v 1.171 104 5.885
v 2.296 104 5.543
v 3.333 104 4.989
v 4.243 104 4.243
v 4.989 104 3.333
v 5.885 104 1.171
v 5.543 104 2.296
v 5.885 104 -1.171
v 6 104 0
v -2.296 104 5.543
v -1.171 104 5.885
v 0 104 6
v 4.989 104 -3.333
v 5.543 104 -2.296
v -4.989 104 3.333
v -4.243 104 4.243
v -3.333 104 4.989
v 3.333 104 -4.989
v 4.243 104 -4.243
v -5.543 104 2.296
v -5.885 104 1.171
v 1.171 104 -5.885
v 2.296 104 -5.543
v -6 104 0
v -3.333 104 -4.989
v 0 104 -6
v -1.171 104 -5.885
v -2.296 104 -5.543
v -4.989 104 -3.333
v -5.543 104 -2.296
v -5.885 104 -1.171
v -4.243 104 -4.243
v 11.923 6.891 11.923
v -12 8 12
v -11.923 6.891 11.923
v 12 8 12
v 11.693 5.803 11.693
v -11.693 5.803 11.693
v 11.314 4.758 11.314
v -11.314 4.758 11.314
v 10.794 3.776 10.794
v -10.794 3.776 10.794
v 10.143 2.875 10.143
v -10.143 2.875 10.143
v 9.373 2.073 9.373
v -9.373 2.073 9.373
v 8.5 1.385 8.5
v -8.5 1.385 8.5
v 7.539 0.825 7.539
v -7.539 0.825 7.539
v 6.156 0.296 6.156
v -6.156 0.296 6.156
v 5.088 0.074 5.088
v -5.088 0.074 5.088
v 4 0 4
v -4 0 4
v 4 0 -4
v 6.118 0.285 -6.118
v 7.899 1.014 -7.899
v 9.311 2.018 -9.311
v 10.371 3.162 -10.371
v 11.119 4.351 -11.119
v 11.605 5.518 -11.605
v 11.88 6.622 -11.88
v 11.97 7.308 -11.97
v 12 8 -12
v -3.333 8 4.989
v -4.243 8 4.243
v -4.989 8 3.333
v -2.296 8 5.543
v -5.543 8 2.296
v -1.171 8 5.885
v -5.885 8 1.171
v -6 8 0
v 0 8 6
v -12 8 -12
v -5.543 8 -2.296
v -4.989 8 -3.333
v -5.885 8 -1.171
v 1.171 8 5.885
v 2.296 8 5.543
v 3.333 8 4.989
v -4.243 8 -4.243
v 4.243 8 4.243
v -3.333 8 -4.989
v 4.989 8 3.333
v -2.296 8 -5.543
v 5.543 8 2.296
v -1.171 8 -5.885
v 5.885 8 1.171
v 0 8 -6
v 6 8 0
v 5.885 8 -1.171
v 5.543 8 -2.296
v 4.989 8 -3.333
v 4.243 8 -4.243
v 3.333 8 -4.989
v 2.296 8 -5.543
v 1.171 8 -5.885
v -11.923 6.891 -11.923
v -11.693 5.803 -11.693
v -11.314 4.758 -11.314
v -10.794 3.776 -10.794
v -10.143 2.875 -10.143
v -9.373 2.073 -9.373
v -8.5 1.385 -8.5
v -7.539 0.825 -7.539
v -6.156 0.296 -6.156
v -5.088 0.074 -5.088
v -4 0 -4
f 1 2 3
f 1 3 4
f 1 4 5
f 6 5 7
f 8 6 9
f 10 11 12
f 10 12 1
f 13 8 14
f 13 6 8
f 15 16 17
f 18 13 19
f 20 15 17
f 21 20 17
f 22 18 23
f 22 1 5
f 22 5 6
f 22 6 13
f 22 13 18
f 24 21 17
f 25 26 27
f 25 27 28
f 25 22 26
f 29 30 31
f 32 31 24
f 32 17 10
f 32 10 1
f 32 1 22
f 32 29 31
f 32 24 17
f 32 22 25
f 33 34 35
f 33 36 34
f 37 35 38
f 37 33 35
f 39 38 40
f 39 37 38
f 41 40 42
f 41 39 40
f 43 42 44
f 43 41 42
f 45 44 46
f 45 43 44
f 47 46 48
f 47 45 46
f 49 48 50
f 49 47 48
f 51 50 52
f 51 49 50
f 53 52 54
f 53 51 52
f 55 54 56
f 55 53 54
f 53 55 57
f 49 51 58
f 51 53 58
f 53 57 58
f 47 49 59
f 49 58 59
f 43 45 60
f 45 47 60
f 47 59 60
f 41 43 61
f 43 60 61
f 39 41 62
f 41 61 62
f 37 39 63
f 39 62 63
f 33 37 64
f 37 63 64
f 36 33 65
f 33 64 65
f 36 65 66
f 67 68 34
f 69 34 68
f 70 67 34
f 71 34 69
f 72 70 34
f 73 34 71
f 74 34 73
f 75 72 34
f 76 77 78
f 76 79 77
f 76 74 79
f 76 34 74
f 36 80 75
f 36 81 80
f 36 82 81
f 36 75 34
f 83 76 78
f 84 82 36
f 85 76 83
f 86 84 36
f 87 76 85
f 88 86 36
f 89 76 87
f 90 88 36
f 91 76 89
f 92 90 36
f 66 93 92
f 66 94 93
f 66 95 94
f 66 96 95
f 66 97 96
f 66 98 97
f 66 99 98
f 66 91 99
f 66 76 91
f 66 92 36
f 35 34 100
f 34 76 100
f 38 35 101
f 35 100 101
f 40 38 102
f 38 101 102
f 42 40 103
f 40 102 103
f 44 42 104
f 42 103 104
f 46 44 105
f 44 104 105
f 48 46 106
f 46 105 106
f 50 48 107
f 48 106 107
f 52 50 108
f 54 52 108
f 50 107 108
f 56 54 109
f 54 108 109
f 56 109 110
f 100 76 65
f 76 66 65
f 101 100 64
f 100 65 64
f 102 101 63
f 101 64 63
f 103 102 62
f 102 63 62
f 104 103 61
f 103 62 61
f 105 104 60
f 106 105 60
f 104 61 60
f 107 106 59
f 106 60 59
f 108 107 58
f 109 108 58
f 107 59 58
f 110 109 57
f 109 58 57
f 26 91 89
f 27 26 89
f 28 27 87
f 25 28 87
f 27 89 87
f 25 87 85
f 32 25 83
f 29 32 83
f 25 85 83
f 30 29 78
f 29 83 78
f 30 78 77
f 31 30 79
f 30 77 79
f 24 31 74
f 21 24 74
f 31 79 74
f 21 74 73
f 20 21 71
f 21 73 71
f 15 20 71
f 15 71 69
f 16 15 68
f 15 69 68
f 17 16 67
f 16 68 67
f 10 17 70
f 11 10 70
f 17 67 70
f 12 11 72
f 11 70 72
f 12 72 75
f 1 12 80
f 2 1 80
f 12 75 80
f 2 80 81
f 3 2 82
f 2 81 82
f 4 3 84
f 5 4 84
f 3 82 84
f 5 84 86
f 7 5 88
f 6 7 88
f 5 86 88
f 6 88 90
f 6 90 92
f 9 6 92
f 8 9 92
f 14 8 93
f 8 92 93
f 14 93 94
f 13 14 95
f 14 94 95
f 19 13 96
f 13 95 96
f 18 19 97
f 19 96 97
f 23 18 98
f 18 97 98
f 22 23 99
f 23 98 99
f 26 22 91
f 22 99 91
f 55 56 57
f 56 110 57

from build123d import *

# Parameters (mm, degrees)
SKETCH1_W           = 24
SKETCH1_H           = 24
BOSS_EXTRUDE1_DEPTH = 8
SKETCH2_R           = 6
BOSS_EXTRUDE2_DEPTH = 96
FILLET1_R           = 8


with BuildPart() as part:
    # Sketch1 → Boss-Extrude1 (new body)
    with BuildSketch(Plane(origin=(0, 0, 0), x_dir=(1, 0, 0), z_dir=(0, 1, 0))):
        Rectangle(SKETCH1_W, SKETCH1_H)
    extrude(amount=BOSS_EXTRUDE1_DEPTH)

    # Sketch2 → Boss-Extrude2 (add)
    with BuildSketch(Plane(origin=(0, 8, 0), x_dir=(1, 0, 0), z_dir=(0, 1, 0))):
        with Locations(Location((0, 0, 0), (0, 0, 90))):
            Circle(SKETCH2_R)
    extrude(amount=BOSS_EXTRUDE2_DEPTH)

    # Fillet1
    fillet1_edges = [part.edges().sort_by_distance(p)[0] for p in [
        (0, 0, 12),
        (12, 0, 0),
        (-12, 0, 0),
        (0, 0, -12),
    ]]
    fillet(fillet1_edges, radius=FILLET1_R - 0.0001)  # a hair under: the kernel refuses the full size


solid = part.part
